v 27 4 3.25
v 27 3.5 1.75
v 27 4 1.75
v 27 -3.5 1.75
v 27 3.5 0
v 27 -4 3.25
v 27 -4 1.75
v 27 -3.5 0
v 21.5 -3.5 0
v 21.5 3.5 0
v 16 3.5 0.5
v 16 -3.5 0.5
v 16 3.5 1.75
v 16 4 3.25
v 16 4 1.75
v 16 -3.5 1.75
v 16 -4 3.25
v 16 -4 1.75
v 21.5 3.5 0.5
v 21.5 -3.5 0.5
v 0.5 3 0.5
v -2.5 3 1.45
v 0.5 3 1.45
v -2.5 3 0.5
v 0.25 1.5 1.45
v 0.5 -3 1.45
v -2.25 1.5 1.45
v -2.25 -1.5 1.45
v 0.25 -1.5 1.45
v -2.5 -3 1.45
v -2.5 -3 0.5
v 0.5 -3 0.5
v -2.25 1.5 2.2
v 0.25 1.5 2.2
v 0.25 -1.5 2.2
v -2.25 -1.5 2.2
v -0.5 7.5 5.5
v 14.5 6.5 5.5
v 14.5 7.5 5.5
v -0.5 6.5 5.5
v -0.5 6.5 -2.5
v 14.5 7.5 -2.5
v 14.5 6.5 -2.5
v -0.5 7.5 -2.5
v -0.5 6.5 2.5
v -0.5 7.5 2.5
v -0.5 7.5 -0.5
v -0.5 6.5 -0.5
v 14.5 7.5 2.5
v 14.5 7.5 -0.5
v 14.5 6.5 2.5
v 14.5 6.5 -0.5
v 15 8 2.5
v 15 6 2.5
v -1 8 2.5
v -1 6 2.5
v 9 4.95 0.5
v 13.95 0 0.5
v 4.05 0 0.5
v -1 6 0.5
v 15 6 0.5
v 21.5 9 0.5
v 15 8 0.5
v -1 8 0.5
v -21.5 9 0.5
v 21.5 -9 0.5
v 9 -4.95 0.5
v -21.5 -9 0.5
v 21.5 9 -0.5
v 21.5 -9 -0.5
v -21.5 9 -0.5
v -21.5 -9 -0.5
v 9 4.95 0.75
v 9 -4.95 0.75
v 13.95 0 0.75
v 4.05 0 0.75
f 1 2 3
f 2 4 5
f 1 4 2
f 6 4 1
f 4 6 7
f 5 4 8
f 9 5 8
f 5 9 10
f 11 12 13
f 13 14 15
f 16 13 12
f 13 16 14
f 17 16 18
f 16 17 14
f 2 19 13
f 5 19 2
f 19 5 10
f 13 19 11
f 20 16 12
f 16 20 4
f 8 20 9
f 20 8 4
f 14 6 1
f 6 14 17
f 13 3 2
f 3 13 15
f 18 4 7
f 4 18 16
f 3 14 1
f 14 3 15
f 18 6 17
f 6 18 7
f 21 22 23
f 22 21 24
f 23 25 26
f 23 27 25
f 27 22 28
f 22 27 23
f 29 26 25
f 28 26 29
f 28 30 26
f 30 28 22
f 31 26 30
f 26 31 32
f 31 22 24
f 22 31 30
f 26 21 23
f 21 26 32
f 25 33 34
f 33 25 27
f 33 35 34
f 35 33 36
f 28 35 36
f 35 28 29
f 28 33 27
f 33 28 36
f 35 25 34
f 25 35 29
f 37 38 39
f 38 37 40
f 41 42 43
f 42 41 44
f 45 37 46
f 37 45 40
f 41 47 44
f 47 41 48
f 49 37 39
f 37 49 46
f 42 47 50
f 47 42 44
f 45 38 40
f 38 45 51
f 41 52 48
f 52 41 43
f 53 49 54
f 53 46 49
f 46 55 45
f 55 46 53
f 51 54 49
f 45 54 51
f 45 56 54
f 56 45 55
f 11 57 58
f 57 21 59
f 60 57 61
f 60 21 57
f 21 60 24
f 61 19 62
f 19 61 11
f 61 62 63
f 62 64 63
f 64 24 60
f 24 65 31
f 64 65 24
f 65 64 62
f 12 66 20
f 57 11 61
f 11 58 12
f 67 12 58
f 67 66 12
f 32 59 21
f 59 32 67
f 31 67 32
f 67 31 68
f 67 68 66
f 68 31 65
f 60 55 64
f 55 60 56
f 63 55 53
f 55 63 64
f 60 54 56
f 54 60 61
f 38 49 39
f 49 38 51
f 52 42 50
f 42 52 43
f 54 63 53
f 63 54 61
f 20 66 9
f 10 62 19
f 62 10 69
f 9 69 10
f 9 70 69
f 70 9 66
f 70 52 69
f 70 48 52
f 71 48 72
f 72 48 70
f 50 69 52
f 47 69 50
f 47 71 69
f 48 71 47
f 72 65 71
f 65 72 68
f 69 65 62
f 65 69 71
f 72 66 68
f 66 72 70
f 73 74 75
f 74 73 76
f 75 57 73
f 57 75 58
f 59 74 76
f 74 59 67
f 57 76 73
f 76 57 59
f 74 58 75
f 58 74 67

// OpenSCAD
hore = 0; //ci budu piny napajkovane smerom hore alebo dole
module doska(){
color( "MediumBlue", 1.0 )
 cube([43,18,1], true);
}

module connector(){
     cube([11,7,2], true);
     translate([0,0,1.5])
      cube([11,8,1.5], true);
}
module ATMega(){
    color( "Black", 1.0 )
     cube([7,7,0.5], true);
}
module reset(){
    color( "Silver", 1.0 )
    cube([6,3,1.5], true);
    translate([0,0,1])
    color( "White", 1.0 )
     cube([3,2.5,1], true);
}
module pin(){
   color( "Silver", 1.0 )
    cube([1,1,8], true); 
   color( "Black", 1.0 )
    cube([2,2,2], true); 
}

module celok(){
doska();
    
translate([21.5,0,1])
connector();
    
translate([9,0,0.5])
rotate([0,0,45])
ATMega();
    
translate([-1,0,0.7])
rotate([0,0,90])
reset();

for (i = [0:14])
{
    translate([i,7,1.5])
     pin();
}

}
celok();
